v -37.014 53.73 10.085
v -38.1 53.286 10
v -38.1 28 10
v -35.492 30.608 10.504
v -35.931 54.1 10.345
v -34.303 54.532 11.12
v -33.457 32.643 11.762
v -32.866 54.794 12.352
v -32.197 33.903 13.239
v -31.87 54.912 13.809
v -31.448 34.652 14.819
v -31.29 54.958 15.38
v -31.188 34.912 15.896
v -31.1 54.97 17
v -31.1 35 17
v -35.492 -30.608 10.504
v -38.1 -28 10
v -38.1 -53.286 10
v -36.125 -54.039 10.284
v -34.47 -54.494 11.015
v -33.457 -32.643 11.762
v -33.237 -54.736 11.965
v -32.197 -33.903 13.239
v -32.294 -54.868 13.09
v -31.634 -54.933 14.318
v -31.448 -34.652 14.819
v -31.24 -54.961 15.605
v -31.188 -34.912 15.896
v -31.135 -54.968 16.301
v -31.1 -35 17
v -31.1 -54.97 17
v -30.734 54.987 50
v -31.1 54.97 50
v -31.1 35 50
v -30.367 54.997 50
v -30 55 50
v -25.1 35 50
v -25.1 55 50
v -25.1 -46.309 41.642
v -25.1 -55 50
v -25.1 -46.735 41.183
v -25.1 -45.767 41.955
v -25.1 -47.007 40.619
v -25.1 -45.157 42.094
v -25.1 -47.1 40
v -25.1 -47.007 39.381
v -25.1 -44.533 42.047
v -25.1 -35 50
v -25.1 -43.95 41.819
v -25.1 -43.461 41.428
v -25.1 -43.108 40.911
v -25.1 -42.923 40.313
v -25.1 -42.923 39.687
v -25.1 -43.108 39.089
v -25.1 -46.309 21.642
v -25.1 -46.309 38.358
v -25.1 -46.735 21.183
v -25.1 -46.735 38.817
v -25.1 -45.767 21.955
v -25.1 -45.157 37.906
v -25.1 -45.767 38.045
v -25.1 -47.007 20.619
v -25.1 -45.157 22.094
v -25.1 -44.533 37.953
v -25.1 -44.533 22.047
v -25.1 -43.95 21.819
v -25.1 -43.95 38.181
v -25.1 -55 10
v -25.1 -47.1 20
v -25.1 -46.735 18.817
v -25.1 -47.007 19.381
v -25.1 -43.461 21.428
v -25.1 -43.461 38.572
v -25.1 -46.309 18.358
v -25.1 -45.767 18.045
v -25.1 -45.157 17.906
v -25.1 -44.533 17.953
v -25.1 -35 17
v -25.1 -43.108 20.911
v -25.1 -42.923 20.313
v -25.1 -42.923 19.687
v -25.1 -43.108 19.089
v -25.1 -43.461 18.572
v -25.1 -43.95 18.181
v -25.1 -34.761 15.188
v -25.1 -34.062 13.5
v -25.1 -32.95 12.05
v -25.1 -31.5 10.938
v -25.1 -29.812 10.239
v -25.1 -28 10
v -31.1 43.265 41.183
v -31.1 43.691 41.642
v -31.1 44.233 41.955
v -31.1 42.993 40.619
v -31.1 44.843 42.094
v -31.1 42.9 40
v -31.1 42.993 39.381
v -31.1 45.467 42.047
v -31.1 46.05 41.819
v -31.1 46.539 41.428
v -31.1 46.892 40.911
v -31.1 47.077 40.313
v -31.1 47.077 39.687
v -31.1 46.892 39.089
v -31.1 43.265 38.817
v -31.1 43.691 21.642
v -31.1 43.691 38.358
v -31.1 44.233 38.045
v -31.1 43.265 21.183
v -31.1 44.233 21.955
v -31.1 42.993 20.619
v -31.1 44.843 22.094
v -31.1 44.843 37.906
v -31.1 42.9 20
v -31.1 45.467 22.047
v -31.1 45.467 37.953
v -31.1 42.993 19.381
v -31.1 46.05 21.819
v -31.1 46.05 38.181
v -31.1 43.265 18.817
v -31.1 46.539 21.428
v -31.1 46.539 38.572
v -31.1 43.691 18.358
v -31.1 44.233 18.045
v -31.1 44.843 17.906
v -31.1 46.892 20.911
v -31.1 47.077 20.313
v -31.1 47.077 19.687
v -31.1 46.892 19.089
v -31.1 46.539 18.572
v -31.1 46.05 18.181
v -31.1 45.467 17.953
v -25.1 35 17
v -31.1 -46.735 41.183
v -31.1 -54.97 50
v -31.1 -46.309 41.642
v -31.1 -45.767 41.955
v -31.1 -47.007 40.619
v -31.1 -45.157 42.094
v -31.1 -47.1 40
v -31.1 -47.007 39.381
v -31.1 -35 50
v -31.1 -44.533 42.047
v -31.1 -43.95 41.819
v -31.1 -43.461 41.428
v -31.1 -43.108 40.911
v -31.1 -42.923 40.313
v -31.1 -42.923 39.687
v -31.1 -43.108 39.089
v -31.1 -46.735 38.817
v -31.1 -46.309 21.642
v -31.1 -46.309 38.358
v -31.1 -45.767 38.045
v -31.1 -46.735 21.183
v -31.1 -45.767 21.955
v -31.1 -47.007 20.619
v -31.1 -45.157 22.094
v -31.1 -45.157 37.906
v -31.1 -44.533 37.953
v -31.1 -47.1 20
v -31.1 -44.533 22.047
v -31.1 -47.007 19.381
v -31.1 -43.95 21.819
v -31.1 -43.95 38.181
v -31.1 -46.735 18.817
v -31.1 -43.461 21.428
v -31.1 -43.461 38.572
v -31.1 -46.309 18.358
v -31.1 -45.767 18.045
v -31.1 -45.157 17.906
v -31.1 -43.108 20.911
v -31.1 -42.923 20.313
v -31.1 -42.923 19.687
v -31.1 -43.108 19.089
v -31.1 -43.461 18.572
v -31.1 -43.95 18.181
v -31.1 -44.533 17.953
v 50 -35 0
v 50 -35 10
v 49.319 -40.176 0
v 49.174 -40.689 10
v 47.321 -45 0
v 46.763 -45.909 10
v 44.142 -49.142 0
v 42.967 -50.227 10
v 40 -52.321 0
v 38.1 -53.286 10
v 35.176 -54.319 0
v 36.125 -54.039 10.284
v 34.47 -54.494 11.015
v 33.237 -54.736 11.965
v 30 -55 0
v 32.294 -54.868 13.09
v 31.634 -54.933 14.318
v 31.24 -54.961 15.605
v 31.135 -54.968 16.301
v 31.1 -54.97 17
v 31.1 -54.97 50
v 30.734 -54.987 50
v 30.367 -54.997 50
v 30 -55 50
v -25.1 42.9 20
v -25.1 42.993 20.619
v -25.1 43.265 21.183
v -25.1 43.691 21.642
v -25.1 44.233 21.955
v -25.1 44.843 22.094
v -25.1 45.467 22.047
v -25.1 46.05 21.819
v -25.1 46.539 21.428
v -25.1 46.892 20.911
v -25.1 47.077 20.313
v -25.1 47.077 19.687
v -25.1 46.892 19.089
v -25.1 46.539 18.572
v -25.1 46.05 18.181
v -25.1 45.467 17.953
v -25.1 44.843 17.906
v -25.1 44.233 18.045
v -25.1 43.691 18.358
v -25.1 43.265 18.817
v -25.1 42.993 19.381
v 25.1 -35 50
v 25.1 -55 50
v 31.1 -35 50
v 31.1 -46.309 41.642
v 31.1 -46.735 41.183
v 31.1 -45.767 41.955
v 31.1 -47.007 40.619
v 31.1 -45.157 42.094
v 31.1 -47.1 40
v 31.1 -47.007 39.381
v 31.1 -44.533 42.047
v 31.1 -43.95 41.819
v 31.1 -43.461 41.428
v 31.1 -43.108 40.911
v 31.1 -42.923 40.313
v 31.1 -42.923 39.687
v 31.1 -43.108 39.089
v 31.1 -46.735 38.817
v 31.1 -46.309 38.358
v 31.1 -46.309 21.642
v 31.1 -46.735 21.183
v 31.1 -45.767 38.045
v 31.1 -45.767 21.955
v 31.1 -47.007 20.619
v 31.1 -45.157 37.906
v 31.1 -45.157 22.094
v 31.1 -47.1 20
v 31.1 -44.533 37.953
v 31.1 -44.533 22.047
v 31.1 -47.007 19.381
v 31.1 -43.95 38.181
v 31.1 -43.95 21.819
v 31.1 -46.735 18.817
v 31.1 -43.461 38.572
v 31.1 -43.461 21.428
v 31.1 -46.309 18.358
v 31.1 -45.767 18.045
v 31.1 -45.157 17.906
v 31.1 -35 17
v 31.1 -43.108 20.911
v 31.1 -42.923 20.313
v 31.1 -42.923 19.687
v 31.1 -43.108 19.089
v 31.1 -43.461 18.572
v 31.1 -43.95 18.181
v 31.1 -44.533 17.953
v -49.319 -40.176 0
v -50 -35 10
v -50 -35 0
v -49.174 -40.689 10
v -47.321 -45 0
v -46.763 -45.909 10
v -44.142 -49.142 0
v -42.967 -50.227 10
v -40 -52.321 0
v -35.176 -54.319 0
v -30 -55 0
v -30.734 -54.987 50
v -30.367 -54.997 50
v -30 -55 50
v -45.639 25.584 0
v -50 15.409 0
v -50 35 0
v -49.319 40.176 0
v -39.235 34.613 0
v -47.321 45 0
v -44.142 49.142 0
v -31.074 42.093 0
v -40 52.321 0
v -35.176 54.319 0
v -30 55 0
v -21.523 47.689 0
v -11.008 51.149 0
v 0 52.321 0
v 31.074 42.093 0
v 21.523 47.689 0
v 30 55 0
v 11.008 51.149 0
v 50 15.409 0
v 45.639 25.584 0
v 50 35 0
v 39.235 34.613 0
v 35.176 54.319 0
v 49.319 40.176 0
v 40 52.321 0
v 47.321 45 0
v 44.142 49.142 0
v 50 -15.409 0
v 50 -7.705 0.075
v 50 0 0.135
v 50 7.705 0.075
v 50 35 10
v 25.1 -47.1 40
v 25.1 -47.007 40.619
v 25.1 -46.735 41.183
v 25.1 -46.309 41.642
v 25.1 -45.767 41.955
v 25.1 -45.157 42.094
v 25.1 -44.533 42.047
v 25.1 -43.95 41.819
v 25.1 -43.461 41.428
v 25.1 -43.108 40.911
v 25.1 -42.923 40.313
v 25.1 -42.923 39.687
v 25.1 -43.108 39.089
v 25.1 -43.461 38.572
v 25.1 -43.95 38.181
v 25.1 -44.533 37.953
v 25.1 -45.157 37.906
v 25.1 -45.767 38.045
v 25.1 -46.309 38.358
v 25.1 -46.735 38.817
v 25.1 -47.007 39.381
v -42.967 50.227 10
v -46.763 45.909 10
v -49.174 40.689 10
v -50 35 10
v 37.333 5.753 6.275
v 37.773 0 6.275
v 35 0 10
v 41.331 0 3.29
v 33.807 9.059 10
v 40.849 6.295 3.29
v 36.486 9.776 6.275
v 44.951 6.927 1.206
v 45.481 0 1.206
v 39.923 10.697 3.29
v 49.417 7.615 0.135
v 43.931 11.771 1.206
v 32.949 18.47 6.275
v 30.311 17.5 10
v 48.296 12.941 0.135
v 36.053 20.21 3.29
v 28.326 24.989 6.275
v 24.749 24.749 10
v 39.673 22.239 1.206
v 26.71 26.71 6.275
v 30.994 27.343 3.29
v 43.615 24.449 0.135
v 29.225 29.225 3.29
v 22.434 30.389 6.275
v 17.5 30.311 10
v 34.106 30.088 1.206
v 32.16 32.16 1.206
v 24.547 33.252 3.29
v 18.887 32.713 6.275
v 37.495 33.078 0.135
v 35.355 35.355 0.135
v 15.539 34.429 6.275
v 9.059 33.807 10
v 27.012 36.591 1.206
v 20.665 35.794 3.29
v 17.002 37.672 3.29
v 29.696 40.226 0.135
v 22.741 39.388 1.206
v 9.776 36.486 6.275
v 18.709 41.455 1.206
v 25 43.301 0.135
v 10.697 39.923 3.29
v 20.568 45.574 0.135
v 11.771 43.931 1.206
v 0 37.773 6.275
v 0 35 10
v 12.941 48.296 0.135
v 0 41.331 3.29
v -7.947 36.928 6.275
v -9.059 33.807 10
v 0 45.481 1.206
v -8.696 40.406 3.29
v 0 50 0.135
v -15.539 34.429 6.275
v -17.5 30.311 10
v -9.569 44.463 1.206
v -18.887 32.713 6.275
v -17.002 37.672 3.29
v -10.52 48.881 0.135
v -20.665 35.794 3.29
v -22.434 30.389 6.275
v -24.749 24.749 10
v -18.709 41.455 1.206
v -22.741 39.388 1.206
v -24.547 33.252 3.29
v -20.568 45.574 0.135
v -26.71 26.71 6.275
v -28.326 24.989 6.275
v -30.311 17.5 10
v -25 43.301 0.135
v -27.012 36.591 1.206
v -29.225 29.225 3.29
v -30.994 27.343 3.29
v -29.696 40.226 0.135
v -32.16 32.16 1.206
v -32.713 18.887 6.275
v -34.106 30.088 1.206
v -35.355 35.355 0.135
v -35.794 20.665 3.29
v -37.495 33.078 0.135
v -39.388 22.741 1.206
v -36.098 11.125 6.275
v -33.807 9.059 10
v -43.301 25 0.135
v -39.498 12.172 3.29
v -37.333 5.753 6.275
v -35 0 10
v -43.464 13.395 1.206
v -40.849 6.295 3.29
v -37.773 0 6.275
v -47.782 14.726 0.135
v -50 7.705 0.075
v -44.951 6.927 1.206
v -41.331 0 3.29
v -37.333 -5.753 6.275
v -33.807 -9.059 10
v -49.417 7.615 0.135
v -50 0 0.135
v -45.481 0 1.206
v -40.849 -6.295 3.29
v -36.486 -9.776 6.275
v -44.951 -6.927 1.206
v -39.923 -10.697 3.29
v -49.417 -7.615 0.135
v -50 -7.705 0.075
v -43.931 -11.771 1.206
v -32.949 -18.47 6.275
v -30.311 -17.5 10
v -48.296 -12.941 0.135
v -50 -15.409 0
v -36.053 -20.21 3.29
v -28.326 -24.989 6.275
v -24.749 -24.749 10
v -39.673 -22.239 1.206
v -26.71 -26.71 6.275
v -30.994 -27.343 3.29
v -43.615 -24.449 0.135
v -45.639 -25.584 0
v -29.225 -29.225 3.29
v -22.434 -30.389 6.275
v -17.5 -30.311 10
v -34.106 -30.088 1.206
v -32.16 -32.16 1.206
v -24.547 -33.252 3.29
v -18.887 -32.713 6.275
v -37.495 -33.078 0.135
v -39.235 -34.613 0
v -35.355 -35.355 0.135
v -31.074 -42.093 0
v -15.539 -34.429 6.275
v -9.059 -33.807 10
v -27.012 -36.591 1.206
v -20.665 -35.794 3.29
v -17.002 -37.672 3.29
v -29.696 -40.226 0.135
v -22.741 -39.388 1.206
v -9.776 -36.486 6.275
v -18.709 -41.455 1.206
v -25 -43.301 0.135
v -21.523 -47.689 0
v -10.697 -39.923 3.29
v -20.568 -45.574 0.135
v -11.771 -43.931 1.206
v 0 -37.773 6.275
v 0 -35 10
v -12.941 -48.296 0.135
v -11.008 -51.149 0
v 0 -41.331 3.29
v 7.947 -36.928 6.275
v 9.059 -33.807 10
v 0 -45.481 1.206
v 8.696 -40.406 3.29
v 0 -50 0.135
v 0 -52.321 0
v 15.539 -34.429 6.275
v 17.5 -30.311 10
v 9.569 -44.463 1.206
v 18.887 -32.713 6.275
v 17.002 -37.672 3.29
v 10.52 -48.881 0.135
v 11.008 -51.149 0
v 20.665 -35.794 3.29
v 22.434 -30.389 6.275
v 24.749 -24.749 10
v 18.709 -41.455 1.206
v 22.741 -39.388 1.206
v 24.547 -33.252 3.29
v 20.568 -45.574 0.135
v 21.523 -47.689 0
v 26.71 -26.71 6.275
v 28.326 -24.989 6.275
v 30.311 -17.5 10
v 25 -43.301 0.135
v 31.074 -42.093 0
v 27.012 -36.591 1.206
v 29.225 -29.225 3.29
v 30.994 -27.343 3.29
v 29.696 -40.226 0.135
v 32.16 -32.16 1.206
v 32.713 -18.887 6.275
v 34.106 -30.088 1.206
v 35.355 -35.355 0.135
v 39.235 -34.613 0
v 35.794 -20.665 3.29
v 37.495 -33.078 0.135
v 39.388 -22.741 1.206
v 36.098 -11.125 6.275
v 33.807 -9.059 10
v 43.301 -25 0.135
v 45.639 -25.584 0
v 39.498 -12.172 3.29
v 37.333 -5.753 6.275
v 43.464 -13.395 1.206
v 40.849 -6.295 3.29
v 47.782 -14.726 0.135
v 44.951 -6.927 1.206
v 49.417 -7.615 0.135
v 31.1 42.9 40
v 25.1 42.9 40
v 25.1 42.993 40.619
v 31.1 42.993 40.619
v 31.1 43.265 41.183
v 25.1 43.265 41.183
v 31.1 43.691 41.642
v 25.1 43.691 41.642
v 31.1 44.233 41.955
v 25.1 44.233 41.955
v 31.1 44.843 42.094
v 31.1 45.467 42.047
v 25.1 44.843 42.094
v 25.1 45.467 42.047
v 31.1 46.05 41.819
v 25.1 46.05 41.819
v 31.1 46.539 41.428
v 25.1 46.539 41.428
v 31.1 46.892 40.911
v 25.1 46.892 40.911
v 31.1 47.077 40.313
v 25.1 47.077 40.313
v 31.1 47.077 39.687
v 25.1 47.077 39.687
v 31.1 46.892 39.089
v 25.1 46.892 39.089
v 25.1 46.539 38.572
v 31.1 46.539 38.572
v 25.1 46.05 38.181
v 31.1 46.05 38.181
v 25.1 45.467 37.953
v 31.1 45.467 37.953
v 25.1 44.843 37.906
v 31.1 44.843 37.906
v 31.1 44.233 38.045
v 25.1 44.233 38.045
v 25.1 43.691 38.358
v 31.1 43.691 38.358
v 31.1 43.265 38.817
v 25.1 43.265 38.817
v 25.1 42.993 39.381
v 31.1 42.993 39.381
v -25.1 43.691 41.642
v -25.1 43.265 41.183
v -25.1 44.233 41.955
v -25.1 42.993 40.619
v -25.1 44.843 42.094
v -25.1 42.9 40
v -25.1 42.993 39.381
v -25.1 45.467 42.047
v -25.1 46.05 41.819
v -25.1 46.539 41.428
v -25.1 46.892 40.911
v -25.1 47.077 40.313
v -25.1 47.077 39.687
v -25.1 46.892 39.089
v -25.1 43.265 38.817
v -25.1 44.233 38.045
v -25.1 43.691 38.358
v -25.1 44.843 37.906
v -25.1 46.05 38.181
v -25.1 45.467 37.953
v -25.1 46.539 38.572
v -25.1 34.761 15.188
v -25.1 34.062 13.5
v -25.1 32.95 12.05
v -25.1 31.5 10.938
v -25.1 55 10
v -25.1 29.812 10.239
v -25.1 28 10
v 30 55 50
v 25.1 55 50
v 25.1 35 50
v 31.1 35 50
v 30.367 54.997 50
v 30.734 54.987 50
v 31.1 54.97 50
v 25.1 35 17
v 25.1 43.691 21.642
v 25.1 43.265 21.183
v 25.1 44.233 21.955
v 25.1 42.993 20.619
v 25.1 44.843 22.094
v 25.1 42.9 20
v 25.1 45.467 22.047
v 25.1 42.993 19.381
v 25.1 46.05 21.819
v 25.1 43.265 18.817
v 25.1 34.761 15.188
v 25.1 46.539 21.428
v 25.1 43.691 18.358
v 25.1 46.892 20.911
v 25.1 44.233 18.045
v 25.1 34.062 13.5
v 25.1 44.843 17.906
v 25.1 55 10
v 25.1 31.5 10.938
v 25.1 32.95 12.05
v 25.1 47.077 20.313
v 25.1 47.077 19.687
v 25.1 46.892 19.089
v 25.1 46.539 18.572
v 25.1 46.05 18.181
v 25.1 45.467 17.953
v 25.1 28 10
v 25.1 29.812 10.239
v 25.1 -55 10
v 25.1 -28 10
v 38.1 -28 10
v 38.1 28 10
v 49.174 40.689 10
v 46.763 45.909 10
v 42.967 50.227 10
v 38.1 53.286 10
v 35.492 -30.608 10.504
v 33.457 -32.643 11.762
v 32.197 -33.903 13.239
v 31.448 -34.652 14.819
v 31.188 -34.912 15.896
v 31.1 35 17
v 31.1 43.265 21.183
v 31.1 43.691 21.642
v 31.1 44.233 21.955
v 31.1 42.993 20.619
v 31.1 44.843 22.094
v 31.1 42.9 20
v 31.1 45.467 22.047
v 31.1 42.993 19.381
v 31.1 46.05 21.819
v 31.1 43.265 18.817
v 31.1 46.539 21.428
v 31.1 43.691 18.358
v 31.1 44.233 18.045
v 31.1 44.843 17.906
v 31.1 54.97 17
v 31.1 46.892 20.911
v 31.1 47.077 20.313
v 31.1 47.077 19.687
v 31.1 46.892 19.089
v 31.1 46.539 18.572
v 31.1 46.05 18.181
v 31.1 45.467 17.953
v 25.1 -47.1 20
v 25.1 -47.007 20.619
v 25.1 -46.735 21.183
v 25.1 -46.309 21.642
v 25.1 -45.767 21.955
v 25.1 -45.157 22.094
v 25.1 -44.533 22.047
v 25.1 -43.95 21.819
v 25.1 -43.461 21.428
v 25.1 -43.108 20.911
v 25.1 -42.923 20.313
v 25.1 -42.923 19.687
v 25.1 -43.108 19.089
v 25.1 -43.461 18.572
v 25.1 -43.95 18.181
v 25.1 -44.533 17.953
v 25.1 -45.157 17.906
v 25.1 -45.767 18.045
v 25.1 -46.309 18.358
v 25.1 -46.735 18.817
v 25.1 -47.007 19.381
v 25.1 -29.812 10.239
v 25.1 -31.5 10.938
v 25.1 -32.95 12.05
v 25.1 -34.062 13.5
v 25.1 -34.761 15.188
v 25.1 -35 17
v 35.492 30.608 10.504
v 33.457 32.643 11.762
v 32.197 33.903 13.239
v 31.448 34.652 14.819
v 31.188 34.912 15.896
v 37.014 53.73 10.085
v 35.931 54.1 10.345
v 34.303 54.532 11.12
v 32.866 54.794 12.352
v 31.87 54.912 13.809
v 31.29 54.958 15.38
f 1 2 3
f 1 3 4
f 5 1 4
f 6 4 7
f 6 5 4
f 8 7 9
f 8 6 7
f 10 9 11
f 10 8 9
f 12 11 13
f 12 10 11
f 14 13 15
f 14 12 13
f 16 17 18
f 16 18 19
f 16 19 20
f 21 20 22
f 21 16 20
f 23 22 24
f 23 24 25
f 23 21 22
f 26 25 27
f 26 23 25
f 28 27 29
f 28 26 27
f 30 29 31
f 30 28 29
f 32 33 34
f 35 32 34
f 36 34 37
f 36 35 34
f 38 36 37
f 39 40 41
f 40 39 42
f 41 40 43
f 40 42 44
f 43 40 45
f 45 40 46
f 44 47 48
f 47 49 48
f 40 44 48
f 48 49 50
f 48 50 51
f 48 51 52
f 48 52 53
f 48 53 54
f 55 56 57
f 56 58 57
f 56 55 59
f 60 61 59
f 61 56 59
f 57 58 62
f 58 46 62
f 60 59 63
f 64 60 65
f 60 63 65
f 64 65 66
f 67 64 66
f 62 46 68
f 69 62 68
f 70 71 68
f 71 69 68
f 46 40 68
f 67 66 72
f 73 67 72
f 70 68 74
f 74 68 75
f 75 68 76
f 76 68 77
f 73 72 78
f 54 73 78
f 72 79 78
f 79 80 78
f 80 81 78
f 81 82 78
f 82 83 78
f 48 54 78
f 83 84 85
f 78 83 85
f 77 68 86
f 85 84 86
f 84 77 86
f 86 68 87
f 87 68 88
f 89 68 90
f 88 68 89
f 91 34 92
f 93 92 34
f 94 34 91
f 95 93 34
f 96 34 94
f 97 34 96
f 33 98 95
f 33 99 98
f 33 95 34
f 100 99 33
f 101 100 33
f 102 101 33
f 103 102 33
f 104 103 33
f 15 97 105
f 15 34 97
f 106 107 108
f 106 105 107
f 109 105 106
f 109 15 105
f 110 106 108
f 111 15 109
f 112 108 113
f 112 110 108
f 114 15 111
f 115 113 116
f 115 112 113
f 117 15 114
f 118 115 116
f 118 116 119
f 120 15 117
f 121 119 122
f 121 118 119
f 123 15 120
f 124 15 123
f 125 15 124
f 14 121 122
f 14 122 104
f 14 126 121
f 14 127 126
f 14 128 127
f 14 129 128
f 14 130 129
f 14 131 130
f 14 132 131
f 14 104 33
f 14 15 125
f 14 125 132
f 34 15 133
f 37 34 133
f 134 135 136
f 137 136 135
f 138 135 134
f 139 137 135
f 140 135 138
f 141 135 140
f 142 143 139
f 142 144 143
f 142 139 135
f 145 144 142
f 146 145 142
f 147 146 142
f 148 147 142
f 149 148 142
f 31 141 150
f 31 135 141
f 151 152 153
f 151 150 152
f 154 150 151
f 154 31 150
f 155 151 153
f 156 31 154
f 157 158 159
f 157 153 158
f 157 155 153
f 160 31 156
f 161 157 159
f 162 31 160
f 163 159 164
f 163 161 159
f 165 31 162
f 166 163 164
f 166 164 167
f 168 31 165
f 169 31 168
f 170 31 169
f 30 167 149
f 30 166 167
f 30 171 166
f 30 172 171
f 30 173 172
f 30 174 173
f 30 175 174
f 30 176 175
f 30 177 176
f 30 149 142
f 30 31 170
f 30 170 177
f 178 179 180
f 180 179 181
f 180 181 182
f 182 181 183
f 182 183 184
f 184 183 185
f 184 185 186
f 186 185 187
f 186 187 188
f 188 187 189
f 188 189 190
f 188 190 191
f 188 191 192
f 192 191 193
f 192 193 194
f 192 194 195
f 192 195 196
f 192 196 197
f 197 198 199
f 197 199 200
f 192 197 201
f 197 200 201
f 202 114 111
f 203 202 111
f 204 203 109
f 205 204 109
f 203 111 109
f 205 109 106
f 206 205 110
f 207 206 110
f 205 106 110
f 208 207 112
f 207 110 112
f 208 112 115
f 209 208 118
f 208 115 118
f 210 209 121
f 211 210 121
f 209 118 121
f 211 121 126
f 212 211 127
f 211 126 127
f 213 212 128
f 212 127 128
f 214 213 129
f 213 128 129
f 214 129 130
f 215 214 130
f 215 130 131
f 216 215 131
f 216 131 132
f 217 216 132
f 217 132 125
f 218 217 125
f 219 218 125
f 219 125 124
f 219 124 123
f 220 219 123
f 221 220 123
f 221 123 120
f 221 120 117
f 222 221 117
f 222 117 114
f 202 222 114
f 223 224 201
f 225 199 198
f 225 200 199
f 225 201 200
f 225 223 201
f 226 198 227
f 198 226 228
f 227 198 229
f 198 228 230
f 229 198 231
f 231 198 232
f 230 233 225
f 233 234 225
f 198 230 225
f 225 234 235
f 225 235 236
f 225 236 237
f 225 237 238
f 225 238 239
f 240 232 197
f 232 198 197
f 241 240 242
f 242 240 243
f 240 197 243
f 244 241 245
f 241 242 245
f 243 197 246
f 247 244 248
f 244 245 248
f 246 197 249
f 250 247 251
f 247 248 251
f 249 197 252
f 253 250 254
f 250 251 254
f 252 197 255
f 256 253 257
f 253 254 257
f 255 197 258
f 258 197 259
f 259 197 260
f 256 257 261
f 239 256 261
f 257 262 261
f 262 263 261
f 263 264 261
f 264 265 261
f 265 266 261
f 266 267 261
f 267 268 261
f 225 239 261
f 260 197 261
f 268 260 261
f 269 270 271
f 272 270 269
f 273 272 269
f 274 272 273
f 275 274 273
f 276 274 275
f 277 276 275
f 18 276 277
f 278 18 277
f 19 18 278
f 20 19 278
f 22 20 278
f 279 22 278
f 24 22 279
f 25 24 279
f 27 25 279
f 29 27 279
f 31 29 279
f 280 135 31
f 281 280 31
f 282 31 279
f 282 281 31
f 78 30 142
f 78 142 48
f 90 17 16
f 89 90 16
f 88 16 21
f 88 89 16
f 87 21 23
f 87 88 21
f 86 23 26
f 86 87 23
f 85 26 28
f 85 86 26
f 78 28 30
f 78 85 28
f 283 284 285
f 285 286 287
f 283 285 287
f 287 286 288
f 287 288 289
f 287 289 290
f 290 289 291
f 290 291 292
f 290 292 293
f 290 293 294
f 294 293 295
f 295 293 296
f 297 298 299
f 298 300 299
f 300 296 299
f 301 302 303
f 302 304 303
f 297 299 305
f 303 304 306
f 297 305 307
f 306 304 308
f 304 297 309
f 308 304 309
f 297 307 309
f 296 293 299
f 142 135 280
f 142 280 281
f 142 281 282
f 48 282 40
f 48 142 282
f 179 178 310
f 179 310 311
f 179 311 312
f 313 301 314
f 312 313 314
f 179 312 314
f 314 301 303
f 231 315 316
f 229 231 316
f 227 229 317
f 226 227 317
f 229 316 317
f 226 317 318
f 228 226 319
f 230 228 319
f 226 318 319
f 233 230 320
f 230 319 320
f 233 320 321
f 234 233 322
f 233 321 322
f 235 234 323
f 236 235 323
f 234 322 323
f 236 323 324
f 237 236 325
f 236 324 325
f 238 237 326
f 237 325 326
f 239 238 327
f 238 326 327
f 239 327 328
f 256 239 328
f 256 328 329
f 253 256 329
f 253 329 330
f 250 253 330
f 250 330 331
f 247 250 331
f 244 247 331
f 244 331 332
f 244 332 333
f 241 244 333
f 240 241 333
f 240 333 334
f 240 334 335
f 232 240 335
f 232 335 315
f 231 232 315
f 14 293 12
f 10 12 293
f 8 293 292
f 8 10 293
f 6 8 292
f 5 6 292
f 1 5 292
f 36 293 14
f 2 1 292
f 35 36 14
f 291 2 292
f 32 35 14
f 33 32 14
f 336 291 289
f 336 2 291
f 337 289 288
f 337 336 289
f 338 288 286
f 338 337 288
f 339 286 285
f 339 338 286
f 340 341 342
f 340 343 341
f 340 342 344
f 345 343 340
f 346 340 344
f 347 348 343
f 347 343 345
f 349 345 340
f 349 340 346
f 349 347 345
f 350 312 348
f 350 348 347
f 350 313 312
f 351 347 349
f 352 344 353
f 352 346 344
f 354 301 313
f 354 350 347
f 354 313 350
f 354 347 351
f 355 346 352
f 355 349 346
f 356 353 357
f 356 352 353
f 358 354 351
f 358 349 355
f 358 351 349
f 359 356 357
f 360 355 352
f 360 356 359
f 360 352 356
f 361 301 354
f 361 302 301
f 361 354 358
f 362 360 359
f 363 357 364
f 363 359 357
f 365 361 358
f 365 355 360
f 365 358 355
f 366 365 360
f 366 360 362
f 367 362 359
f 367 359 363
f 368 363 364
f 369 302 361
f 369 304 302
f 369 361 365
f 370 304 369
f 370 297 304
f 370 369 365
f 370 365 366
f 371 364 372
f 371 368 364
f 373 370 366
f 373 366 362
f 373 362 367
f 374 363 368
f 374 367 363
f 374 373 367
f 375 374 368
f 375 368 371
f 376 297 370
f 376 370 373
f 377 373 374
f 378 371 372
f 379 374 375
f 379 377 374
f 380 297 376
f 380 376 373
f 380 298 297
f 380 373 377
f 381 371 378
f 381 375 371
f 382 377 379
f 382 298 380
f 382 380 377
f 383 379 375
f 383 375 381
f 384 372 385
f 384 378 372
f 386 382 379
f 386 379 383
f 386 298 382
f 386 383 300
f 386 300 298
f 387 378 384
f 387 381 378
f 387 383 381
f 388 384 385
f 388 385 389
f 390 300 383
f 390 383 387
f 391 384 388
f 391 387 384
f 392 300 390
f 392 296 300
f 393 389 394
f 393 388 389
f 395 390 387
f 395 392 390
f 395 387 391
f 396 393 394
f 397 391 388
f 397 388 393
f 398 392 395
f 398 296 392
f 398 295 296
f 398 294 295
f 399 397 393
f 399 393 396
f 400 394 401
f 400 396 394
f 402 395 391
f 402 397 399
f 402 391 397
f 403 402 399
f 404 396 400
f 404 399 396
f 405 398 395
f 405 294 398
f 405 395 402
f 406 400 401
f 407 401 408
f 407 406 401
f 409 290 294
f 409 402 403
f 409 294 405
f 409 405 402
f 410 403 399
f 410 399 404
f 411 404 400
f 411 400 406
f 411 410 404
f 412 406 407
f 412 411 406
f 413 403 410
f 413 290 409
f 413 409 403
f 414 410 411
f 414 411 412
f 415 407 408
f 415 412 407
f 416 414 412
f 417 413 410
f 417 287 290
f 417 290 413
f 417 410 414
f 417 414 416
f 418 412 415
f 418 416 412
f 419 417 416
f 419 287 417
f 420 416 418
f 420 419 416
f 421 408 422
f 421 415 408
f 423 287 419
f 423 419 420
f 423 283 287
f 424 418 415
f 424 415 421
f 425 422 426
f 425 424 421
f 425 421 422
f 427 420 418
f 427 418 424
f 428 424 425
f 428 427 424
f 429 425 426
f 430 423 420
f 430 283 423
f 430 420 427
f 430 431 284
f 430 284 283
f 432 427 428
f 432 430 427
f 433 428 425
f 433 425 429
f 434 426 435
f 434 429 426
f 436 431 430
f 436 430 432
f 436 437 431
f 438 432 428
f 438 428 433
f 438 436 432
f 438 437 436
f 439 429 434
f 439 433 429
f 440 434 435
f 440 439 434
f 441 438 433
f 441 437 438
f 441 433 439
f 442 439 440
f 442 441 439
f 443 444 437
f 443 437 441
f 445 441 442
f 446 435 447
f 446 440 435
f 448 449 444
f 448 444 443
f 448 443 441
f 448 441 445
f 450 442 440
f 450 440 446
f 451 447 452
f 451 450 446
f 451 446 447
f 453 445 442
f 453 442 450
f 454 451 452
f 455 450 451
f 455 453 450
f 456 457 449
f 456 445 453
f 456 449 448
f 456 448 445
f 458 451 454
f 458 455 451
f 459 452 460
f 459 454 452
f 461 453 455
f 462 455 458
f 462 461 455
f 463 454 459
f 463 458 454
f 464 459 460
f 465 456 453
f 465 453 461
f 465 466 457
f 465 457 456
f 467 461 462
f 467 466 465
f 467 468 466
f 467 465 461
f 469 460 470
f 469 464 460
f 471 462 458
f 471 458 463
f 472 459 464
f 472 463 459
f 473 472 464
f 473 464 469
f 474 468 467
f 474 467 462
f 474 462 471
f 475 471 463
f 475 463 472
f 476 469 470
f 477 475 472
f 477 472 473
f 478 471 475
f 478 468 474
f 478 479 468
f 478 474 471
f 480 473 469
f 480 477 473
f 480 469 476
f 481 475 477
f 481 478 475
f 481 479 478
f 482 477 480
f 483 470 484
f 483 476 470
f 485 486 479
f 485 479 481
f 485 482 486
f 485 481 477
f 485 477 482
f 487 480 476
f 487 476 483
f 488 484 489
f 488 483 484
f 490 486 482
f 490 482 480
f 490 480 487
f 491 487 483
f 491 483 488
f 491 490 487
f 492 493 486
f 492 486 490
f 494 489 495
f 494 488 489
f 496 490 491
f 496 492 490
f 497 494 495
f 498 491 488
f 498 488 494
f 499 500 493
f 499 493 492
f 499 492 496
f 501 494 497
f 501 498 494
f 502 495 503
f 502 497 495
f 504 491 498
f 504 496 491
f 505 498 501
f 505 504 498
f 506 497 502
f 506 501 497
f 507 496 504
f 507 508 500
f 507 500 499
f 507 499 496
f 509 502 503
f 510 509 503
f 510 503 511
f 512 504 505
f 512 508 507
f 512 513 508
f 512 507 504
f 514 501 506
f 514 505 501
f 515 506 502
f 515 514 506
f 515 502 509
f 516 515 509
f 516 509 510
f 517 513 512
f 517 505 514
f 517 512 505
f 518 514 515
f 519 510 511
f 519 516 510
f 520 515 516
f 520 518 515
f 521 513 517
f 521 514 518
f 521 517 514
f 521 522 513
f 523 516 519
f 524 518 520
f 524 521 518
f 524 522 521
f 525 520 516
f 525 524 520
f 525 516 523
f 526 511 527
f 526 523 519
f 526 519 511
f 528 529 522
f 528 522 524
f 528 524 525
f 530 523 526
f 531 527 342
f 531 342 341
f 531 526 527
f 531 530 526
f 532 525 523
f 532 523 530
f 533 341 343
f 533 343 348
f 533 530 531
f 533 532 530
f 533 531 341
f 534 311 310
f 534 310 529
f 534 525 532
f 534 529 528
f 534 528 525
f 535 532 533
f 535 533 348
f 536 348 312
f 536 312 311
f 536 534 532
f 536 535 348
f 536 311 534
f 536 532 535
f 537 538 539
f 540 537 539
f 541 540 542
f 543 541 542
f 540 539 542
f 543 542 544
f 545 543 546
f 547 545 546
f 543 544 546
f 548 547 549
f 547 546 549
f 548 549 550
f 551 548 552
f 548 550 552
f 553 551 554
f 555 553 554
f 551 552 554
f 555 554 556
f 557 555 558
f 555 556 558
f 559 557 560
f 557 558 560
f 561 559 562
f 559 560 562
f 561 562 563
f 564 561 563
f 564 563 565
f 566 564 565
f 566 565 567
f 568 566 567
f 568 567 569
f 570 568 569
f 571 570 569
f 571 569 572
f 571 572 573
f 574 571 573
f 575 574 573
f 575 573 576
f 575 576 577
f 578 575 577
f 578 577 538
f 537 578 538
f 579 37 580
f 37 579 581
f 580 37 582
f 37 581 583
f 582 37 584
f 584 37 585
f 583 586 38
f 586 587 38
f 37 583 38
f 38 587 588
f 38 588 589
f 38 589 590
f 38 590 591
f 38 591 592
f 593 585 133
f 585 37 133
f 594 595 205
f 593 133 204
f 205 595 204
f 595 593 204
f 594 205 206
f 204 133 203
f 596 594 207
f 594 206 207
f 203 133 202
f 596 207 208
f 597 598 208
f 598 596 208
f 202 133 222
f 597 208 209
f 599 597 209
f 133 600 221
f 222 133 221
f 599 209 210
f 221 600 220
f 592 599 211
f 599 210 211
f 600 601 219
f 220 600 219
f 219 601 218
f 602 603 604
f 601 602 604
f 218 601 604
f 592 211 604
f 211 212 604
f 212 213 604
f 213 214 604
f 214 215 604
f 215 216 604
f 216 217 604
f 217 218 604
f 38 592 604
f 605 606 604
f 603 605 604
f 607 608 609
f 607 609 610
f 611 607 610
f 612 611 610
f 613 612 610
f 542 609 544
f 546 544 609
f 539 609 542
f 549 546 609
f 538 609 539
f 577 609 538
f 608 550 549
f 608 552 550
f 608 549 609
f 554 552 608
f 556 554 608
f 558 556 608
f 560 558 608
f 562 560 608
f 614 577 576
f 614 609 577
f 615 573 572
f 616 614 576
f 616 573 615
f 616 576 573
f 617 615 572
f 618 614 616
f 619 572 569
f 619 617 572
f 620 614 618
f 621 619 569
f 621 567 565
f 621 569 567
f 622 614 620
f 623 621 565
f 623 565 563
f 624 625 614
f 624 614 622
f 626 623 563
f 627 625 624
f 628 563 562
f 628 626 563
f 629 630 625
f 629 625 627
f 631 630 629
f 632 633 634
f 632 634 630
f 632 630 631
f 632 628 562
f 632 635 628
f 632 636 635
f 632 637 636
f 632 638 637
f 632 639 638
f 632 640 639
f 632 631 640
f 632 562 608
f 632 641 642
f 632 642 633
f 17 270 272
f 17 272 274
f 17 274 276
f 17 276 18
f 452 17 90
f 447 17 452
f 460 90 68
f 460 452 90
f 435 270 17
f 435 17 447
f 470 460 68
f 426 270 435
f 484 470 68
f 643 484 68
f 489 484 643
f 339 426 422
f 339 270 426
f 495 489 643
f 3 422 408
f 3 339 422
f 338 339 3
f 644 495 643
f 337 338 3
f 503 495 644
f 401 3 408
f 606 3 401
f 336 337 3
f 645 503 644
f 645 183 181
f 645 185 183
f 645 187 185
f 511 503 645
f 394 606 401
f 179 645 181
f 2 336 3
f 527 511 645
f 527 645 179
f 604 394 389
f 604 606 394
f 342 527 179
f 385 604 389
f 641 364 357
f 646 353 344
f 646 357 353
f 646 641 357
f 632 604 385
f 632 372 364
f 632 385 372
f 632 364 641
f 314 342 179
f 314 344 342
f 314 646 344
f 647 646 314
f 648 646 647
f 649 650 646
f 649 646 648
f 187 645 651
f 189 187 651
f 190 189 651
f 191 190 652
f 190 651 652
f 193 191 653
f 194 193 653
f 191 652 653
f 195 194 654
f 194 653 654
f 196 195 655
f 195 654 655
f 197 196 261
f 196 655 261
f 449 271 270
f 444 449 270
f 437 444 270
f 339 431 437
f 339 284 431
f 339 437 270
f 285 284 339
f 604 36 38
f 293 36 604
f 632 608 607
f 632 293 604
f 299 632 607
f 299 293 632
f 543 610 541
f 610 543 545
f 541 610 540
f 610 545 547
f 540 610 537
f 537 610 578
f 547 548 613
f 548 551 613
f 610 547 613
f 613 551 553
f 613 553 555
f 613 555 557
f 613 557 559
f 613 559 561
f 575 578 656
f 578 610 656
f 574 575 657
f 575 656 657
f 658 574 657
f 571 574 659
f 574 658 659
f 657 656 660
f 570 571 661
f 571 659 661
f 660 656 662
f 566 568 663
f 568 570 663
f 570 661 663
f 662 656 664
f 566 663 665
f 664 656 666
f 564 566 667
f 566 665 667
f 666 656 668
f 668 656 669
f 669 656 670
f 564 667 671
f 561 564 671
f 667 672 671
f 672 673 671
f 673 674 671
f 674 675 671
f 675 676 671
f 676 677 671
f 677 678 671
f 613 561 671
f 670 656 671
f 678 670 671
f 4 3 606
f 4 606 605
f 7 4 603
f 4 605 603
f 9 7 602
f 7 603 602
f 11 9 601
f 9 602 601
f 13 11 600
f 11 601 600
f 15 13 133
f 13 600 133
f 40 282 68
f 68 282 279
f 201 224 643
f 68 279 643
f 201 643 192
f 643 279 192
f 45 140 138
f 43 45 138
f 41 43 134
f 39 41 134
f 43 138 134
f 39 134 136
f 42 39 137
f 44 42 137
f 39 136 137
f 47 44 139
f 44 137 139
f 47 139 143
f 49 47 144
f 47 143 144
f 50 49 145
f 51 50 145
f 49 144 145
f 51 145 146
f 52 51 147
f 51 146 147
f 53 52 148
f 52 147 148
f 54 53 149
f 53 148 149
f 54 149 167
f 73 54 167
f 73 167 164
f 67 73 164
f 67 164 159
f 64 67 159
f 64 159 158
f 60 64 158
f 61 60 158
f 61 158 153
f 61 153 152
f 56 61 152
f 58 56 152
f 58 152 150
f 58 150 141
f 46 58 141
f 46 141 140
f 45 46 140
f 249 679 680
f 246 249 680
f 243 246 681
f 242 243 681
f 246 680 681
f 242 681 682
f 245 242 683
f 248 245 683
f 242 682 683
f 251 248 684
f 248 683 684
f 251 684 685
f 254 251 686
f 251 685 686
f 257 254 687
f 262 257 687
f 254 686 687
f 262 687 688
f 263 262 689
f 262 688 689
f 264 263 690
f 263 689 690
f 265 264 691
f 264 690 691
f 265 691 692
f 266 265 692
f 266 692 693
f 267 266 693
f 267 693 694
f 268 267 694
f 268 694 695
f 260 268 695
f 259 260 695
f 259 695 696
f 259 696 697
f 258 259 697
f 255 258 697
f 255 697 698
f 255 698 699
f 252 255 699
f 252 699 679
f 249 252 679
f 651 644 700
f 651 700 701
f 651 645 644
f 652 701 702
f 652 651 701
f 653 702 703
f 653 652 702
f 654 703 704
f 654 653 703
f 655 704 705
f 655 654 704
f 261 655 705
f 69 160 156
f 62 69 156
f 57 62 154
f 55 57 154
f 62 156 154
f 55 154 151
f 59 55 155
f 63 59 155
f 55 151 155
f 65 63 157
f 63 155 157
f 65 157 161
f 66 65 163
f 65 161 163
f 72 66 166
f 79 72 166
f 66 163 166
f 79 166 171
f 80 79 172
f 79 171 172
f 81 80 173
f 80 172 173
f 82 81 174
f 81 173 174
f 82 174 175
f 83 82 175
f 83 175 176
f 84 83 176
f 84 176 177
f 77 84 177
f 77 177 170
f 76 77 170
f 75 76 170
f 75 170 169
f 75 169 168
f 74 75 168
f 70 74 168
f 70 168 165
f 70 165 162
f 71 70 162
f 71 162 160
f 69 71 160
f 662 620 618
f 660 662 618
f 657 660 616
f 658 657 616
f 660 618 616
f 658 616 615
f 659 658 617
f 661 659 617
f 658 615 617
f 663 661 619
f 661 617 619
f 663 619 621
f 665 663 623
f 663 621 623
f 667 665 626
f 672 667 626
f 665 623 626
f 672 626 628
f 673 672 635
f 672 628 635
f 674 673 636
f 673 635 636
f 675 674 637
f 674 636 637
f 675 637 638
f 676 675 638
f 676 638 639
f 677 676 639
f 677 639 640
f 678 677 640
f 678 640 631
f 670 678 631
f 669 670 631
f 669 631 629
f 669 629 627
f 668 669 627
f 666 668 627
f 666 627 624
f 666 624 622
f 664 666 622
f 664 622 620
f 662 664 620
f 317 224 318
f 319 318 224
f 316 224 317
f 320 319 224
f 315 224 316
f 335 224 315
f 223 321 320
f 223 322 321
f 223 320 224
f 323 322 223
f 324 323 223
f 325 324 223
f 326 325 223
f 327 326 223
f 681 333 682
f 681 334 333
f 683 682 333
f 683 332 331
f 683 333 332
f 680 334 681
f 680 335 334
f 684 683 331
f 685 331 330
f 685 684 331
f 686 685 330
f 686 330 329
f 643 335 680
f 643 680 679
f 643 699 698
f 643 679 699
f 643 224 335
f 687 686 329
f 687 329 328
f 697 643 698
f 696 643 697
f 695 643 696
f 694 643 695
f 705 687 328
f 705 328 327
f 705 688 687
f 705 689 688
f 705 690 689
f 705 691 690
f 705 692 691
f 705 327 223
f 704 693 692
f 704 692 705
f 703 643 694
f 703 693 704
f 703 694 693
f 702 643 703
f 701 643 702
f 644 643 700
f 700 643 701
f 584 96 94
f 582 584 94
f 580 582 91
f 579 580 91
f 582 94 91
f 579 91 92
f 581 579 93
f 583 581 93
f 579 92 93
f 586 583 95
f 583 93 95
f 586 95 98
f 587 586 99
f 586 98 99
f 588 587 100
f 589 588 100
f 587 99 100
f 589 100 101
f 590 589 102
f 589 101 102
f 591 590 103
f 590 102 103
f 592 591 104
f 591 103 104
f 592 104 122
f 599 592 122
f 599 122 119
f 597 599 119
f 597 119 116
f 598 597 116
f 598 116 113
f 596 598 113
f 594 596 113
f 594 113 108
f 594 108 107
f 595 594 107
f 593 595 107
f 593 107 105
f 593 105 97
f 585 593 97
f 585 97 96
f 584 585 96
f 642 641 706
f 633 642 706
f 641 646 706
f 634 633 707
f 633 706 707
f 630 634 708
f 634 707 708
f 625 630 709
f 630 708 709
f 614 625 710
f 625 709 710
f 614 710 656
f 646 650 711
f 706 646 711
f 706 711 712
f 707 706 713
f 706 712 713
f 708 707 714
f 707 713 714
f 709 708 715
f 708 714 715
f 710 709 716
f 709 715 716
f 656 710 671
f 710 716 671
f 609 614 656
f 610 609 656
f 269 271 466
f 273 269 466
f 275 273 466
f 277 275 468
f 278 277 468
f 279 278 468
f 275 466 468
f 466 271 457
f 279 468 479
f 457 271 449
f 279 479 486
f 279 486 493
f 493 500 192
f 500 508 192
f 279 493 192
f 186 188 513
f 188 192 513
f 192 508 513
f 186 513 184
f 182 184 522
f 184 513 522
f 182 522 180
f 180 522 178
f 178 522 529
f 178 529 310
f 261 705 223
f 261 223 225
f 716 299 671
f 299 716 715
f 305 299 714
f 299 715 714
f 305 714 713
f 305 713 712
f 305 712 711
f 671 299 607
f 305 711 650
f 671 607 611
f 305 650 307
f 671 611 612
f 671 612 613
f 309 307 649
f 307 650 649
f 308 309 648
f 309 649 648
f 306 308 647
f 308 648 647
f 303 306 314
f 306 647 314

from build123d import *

# Parameters (mm, degrees)
SKETCH_1_W          = 100
SKETCH_1_H          = 110
SKETCH_1_R          = 35
EXTRUDE_1_DEPTH     = 10
SKETCH_2_W          = 6
SKETCH_2_H          = 20
EXTRUDE_2_DEPTH     = 40
FILLET_1_R          = 20
FILLET_2_R          = 7
SKETCH_3_R          = 2.1
CUT_EXTRUDE_1_DEPTH = 111.01004512
FILLET_3_R          = 20


with BuildPart() as part:
    # 草图1 → 凸台-拉伸1 (new body)
    with BuildSketch(Plane.XY):
        Rectangle(SKETCH_1_W, SKETCH_1_H)
        Circle(SKETCH_1_R, mode=Mode.SUBTRACT)
    extrude(amount=EXTRUDE_1_DEPTH)

    # 草图2 → 凸台-拉伸2 (add)
    with BuildSketch(Plane.XY.offset(10)):
        with Locations((-28.1, 45)):
            Rectangle(SKETCH_2_W, SKETCH_2_H)
        with Locations((28.1, 45)):
            Rectangle(SKETCH_2_W, SKETCH_2_H)
        with Locations((28.1, -45)):
            Rectangle(SKETCH_2_W, SKETCH_2_H)
        with Locations((-28.1, -45)):
            Rectangle(SKETCH_2_W, SKETCH_2_H)
    extrude(amount=EXTRUDE_2_DEPTH)

    # 圆角1
    # the kernel refuses this fillet: 20 mm, written as the material it takes off along each edge
    with BuildSketch(Plane(origin=(0, 0, 0), x_dir=(1, 0, 0), z_dir=(0, -1, 0))) as fillet_1_piece_1:
        with BuildLine():
            CenterArc((52.320508076, 20), FILLET_1_R, 210, 60)
            Line((35, 10), (35, 0))
            Line((35, 0), (52.320508076, 0))
        make_face()
    revolve(axis=Axis((0, 0, 0), (0, 0, 1)), mode=Mode.SUBTRACT)

    # 圆角2
    fillet_2_edges = [part.edges().sort_by_distance(p)[0] for p in [
        (-31.1, 45, 10),
        (-28.1, 35, 10),
        (28.1, 35, 10),
        (31.1, 45, 10),
        (31.1, -45, 10),
        (28.1, -35, 10),
        (-28.1, -35, 10),
        (-31.1, -45, 10),
    ]]
    fillet(fillet_2_edges, radius=FILLET_2_R)

    # 草图3 → 切除-拉伸1 (cut, through all)
    with BuildSketch(Plane.ZY.offset(31.1)):
        with Locations(Location((20, -45, 0), (0, 0, 270))):
            Circle(SKETCH_3_R)
        with Locations(Location((40, -45, 0), (0, 0, 270))):
            Circle(SKETCH_3_R)
        with Locations(Location((40, 45, 0), (0, 0, 270))):
            Circle(SKETCH_3_R)
        with Locations(Location((20, 45, 0), (0, 0, 270))):
            Circle(SKETCH_3_R)
    extrude(amount=-CUT_EXTRUDE_1_DEPTH, mode=Mode.SUBTRACT)

    # 圆角3
    fillet_3_edges = [part.edges().sort_by_distance(p)[0] for p in [
        (50, -55, 5),
        (50, 55, 5),
        (-50, 55, 5),
        (-50, -55, 5),
    ]]
    fillet(fillet_3_edges, radius=FILLET_3_R)


solid = part.part
